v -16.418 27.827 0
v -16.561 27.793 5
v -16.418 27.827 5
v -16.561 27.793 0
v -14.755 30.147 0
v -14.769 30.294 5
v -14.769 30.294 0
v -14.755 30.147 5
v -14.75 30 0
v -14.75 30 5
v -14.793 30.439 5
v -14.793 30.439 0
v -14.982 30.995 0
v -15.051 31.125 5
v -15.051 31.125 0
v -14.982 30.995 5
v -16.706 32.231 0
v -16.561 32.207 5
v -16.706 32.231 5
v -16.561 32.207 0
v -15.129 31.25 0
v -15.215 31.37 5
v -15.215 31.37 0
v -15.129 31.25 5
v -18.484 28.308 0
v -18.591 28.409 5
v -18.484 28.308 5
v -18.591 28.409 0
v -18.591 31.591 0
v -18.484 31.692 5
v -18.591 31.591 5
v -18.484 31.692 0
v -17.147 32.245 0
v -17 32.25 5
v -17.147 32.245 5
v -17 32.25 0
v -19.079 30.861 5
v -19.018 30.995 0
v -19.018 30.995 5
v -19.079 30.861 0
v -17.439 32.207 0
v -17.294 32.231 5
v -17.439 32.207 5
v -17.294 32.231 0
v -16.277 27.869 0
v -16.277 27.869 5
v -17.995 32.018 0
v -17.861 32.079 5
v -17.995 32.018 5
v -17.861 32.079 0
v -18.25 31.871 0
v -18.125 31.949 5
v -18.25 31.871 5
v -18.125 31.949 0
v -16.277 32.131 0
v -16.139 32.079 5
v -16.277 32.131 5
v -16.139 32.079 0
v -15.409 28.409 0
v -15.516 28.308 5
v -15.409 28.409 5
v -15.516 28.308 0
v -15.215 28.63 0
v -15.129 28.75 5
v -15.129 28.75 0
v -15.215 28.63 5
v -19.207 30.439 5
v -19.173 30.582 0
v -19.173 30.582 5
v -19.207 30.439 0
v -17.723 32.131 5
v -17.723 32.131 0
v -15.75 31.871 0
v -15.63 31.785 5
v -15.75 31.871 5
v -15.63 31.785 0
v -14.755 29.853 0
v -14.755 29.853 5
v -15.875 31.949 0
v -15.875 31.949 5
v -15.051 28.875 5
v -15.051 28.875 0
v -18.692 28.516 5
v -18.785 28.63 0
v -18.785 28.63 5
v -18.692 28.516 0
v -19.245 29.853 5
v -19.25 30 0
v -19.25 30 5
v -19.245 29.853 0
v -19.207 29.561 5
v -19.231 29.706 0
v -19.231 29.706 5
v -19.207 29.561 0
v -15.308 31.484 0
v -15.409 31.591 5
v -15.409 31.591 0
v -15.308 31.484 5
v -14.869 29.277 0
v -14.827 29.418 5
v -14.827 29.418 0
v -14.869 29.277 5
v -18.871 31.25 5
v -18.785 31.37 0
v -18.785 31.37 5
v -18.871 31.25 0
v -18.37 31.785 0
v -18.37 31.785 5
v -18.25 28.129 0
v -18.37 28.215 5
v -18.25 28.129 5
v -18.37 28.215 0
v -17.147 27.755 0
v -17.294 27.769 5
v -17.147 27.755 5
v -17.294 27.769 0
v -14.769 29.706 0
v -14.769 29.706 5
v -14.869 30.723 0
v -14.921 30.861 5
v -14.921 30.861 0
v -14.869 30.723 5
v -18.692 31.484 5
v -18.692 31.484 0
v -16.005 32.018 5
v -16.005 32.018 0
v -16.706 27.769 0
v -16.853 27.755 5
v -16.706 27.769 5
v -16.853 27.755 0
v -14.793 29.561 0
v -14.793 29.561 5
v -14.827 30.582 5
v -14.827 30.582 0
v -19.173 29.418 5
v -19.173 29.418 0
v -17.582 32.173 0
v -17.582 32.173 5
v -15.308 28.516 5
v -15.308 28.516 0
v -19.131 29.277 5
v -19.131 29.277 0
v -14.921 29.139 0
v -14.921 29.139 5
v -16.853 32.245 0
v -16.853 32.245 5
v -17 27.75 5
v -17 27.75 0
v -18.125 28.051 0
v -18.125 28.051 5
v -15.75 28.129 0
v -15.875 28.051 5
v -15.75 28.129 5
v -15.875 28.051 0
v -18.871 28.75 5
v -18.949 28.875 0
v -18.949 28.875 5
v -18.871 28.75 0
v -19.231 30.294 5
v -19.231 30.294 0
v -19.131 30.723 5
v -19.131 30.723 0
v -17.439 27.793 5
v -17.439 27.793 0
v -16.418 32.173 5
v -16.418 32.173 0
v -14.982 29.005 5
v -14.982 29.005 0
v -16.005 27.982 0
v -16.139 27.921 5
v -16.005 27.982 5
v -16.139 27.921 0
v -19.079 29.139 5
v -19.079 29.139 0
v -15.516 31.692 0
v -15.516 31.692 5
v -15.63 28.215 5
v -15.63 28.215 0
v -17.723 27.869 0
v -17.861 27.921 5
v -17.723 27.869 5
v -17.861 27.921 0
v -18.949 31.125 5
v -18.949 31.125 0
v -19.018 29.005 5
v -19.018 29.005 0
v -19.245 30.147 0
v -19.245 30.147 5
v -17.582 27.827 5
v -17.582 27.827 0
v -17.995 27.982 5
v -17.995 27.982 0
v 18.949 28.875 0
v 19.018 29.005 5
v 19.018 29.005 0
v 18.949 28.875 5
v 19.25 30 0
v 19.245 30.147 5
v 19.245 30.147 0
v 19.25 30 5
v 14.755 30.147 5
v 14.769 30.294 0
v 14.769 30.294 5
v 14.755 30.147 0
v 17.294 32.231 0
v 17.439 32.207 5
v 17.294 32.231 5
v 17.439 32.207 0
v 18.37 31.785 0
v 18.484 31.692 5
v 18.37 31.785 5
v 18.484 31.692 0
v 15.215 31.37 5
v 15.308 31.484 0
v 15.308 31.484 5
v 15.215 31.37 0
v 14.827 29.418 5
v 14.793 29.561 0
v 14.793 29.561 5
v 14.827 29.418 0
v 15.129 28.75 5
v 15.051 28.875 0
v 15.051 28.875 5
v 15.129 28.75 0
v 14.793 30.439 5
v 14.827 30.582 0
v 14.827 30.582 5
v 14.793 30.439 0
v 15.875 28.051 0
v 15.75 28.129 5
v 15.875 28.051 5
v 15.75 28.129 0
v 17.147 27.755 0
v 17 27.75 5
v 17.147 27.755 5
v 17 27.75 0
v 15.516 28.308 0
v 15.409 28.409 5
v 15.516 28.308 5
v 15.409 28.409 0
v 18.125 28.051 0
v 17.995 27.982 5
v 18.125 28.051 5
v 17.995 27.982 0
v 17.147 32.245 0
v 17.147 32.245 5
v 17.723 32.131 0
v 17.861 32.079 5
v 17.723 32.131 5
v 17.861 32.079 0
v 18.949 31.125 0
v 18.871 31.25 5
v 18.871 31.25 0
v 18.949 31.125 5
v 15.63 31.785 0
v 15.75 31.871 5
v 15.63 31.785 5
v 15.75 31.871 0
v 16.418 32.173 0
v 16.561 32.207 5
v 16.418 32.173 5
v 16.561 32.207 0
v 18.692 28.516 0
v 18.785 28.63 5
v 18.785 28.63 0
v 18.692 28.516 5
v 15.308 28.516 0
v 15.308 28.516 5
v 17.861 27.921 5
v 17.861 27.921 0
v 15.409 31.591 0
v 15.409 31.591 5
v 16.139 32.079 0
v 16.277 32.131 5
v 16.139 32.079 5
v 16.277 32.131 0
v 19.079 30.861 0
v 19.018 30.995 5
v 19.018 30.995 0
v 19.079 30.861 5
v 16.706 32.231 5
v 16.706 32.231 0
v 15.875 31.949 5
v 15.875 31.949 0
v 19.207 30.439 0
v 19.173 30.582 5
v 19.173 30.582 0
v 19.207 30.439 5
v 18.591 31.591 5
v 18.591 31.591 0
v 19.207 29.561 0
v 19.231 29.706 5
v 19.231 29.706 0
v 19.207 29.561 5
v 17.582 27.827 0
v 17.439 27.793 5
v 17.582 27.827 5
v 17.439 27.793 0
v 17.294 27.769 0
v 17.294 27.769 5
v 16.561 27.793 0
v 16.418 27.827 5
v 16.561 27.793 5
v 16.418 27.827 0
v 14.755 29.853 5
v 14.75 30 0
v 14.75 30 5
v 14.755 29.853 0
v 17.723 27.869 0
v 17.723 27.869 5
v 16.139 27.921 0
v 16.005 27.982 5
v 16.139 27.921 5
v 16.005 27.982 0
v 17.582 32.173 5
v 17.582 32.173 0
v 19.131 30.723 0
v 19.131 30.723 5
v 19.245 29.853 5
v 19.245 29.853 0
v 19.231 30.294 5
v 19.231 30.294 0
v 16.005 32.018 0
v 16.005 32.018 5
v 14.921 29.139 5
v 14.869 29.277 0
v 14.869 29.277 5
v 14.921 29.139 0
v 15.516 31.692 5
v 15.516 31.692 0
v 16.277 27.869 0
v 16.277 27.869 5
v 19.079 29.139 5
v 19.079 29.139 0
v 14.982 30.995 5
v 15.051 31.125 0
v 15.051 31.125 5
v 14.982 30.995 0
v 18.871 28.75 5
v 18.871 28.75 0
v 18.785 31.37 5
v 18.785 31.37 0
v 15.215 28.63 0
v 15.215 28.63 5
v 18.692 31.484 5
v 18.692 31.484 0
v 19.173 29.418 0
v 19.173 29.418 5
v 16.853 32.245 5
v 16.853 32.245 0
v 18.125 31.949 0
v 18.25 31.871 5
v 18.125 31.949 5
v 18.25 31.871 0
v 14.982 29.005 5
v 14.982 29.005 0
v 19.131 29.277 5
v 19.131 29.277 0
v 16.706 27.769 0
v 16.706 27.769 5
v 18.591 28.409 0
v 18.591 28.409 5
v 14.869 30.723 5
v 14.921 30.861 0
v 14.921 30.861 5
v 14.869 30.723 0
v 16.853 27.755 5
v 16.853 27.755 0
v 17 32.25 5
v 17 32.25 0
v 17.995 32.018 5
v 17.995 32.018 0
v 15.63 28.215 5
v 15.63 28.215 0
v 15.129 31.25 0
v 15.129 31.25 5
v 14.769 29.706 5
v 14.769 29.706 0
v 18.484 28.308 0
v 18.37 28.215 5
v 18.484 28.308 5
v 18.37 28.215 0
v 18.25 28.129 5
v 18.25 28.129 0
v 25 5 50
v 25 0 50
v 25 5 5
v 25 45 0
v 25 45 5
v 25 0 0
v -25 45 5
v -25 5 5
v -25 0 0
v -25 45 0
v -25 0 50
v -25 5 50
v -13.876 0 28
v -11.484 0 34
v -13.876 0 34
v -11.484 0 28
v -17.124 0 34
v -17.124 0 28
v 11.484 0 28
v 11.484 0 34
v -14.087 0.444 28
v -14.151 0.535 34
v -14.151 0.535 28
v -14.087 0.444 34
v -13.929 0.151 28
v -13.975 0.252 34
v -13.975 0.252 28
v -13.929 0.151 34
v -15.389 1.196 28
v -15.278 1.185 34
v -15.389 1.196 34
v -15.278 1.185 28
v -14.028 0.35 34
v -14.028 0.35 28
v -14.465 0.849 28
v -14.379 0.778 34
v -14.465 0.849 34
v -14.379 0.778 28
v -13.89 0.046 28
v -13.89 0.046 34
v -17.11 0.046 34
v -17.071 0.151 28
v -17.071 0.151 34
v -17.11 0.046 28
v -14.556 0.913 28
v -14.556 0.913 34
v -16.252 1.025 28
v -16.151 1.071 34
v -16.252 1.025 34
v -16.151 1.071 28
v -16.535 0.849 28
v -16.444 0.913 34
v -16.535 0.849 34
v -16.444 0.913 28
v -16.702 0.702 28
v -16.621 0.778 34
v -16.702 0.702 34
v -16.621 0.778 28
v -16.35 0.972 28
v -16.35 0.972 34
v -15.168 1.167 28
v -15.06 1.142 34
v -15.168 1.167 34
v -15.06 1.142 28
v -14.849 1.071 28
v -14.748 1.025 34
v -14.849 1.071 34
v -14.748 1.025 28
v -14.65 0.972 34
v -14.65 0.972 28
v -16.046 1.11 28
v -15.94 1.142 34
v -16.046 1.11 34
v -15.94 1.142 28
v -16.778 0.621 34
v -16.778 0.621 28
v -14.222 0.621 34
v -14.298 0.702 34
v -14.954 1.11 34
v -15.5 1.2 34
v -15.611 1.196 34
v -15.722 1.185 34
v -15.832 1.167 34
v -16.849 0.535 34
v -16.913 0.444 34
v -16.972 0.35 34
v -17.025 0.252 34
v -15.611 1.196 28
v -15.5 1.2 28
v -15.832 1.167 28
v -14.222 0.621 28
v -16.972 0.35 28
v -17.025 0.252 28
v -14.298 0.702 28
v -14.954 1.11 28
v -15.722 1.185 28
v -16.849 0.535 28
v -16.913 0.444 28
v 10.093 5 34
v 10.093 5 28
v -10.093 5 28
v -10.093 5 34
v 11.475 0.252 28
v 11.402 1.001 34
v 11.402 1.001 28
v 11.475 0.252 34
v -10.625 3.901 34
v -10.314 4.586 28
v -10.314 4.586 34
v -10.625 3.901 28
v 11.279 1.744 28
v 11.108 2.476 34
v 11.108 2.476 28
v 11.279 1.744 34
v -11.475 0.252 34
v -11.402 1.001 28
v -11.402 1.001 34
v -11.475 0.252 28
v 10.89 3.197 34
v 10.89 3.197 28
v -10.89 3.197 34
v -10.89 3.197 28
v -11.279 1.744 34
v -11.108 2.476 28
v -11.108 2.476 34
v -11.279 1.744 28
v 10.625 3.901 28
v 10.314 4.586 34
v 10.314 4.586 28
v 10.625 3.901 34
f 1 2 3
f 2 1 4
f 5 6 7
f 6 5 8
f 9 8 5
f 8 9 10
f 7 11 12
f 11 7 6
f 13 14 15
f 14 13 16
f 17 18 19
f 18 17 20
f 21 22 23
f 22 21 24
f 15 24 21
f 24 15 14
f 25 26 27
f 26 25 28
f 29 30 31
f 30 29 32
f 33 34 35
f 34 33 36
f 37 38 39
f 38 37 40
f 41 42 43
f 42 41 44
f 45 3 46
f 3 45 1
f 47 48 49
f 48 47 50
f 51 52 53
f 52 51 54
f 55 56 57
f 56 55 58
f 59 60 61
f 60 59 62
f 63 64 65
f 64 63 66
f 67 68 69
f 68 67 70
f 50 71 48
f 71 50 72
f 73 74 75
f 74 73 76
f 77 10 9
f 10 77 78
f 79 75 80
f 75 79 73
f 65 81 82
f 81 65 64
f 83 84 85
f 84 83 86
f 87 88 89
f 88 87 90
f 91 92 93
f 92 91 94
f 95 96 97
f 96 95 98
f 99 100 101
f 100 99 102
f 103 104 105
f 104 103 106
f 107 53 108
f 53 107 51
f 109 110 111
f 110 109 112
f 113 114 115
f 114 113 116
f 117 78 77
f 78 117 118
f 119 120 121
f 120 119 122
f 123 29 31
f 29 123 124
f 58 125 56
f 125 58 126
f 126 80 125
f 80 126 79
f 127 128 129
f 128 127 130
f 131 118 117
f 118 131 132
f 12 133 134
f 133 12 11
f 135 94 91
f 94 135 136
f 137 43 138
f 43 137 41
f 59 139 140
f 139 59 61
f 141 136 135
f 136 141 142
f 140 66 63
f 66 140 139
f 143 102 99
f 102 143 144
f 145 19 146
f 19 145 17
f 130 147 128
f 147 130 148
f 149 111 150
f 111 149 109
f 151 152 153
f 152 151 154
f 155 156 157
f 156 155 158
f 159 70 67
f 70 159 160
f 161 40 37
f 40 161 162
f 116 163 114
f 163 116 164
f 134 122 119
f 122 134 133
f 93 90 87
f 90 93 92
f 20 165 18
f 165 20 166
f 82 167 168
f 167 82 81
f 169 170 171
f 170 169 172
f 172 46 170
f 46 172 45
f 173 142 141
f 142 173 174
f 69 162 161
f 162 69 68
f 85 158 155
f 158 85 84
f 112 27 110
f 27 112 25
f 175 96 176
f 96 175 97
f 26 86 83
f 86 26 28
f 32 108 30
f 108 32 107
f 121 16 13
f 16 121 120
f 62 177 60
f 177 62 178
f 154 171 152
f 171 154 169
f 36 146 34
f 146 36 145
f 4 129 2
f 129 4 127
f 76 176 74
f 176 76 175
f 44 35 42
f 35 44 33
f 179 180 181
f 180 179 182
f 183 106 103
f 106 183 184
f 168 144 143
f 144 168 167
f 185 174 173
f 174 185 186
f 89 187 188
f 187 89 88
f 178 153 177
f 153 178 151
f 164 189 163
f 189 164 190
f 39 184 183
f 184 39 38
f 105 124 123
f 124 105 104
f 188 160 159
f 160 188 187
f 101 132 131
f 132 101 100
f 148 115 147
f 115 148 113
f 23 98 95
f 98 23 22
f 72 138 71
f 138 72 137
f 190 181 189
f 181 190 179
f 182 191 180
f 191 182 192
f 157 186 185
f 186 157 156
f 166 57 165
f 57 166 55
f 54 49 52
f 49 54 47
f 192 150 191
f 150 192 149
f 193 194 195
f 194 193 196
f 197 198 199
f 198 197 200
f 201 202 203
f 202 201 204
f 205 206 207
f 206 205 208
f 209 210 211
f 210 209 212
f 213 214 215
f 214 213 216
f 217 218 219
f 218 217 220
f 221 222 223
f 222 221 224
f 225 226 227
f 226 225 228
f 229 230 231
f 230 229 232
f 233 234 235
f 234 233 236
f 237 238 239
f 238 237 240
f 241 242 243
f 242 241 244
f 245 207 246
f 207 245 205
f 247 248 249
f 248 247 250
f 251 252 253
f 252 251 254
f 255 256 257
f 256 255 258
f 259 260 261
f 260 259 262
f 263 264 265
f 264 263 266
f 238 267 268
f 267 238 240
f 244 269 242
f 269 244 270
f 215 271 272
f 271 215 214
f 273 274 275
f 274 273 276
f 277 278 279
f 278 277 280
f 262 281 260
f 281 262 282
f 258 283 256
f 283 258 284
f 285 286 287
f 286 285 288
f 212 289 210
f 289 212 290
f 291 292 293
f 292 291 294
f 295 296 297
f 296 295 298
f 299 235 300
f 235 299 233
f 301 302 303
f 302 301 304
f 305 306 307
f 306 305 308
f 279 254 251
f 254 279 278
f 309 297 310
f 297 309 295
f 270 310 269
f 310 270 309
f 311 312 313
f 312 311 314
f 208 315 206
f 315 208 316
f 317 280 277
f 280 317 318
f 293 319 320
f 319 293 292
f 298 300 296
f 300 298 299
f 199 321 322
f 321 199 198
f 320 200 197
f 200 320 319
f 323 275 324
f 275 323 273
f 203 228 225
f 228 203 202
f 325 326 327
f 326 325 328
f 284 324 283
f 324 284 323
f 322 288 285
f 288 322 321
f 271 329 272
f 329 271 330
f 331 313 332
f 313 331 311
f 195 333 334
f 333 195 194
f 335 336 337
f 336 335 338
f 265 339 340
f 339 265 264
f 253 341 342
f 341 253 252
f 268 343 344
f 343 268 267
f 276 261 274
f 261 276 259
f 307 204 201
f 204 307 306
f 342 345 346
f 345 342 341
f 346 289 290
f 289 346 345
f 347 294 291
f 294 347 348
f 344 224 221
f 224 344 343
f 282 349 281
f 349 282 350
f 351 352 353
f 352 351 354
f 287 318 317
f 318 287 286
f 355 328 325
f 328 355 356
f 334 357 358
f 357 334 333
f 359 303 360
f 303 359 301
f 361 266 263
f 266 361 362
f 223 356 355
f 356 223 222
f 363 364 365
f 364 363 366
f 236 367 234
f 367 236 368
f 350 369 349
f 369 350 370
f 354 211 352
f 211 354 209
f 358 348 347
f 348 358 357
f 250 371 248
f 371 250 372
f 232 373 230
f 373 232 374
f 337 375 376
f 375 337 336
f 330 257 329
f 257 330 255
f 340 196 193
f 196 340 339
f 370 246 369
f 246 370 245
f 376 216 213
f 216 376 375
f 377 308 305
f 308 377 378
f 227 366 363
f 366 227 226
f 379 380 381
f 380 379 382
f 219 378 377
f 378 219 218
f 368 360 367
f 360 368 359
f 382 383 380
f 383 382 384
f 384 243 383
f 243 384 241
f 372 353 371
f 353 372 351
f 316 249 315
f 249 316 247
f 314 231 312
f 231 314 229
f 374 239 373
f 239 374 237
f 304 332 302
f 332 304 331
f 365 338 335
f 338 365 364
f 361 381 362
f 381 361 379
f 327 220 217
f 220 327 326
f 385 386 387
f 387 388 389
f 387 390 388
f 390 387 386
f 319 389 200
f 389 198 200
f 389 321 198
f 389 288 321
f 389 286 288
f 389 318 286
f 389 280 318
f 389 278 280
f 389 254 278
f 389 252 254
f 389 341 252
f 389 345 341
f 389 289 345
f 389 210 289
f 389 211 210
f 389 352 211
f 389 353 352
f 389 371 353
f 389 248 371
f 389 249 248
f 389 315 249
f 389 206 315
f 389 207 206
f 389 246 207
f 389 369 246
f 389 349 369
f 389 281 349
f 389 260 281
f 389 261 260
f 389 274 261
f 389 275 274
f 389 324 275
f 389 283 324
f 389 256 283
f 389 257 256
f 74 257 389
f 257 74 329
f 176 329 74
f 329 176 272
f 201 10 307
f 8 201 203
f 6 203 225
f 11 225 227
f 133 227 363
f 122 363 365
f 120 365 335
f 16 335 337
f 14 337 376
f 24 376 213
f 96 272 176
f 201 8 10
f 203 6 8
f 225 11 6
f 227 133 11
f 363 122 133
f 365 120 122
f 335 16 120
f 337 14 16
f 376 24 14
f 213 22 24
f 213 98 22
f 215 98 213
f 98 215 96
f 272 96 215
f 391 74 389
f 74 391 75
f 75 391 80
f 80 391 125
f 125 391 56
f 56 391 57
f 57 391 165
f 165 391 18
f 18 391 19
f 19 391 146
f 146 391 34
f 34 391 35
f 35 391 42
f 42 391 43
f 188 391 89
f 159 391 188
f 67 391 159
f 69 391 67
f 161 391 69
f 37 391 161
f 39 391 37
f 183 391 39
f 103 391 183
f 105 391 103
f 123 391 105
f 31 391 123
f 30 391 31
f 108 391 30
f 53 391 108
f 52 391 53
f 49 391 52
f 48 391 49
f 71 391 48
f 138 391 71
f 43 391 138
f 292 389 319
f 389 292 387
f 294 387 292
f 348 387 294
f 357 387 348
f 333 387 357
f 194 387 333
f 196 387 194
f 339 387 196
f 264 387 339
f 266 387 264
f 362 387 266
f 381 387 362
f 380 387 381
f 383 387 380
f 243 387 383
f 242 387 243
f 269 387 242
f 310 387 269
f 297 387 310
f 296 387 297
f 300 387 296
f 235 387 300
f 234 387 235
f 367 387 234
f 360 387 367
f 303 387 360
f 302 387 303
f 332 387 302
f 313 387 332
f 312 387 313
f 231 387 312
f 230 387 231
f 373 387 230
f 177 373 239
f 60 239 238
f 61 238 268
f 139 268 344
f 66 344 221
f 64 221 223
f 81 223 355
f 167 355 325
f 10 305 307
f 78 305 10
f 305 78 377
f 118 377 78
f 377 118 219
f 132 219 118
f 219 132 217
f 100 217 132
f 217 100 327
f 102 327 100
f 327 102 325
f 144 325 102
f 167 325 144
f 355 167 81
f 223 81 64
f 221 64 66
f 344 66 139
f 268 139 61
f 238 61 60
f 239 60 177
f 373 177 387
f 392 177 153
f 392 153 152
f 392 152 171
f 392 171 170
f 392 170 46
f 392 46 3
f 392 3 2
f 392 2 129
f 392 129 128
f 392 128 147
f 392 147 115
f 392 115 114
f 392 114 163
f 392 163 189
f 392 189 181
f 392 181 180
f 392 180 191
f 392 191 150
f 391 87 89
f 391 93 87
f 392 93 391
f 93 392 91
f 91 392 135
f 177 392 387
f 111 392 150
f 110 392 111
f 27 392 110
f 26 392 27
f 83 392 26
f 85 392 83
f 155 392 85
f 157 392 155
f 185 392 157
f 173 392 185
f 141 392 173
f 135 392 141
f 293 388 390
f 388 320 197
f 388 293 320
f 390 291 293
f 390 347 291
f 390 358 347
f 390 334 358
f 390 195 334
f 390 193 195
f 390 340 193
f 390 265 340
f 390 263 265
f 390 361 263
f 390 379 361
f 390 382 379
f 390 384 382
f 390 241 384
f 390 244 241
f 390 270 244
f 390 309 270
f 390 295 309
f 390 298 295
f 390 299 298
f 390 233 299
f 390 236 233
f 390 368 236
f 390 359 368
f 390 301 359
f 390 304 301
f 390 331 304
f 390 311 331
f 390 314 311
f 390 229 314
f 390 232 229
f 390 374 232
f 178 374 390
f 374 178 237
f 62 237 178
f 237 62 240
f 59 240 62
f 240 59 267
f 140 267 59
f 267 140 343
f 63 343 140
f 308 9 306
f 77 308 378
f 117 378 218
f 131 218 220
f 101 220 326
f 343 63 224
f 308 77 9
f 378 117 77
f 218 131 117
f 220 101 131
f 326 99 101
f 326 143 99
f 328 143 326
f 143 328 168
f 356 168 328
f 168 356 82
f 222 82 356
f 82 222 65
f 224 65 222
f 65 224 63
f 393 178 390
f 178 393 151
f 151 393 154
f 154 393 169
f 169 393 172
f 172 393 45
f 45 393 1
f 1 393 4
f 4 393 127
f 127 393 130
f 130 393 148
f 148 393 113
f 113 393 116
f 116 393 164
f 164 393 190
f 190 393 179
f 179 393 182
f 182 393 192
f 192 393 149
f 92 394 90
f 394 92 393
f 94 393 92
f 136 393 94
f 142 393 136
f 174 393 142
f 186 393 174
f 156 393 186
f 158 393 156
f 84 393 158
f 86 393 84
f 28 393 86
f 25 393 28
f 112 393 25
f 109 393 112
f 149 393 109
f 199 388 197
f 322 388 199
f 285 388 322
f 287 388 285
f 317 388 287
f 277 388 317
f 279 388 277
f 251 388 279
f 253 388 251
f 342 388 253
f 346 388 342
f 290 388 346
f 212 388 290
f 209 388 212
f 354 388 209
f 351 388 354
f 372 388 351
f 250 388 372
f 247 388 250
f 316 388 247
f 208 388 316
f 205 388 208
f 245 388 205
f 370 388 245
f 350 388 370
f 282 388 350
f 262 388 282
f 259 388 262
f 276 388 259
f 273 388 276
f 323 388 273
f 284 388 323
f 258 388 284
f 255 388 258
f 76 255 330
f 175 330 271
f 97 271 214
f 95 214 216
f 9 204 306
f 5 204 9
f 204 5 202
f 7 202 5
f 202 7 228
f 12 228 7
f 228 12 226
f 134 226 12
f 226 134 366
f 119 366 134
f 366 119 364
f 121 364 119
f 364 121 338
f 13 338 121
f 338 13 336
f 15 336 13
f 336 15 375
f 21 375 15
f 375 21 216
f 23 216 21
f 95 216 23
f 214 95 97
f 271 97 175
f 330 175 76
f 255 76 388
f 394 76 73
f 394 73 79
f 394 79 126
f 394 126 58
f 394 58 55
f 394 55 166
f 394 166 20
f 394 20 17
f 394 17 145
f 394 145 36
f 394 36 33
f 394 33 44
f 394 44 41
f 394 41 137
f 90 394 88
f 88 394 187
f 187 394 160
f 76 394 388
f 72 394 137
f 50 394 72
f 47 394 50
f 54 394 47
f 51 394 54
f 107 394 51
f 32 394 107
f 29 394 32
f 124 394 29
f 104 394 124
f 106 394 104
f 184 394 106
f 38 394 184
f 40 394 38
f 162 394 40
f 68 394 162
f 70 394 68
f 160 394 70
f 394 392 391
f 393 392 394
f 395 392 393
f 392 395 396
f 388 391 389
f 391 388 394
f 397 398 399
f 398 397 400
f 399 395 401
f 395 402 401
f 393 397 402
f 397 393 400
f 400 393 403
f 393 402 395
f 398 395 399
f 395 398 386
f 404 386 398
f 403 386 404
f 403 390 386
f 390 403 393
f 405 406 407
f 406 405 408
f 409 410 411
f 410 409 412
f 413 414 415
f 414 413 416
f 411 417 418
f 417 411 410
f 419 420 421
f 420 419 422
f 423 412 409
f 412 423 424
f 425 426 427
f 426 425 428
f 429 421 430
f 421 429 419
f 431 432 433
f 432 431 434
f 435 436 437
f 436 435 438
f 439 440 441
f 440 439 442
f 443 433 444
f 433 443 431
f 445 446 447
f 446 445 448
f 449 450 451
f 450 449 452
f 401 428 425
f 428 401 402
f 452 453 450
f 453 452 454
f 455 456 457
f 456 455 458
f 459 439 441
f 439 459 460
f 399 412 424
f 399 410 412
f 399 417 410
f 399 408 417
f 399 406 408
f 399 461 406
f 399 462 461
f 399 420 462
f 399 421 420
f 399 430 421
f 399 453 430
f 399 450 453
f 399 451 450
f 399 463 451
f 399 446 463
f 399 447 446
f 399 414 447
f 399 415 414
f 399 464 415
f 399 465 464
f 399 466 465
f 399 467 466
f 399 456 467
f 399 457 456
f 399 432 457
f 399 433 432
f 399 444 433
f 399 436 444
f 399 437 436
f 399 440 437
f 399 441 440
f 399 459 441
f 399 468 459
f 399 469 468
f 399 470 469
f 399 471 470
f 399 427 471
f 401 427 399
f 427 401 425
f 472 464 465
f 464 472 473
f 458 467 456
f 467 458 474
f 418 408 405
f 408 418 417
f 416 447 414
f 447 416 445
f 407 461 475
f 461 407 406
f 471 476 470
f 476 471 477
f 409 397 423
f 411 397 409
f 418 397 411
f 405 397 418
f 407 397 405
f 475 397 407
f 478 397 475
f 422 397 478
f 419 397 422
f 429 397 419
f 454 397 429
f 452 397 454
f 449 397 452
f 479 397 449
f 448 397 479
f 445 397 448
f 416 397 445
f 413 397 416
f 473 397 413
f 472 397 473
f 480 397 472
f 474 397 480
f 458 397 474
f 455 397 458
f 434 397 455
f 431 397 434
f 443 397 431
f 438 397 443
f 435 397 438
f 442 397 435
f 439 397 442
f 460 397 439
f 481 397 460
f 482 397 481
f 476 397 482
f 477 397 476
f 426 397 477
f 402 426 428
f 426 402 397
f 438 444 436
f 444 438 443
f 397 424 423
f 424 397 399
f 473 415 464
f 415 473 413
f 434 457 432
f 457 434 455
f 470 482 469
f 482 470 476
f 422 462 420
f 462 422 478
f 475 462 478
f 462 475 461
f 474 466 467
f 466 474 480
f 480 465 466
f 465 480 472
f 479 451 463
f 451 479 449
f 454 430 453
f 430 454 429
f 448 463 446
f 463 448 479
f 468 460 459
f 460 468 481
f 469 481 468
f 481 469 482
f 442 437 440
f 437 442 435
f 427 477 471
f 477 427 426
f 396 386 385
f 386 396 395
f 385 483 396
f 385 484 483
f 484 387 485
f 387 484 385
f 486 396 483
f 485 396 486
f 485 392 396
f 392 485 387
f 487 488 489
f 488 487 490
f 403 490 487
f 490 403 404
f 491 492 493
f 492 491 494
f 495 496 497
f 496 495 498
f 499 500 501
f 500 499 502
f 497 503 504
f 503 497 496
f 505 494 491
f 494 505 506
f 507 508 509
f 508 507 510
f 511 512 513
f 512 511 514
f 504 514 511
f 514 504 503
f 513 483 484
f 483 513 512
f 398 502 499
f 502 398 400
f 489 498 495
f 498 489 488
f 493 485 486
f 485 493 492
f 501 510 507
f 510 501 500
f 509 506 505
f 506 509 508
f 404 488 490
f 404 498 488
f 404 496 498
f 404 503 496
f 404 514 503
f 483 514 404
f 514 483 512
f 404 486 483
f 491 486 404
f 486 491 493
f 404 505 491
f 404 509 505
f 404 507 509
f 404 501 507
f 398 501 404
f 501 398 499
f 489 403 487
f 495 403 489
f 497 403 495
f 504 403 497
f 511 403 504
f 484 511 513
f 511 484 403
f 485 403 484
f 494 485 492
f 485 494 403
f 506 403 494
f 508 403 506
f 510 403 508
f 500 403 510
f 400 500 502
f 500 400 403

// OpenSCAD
// L-shaped mounting bracket for NEMA 17 stepper motor (e.g. syringe pump)
// Print orientation: base plate on bed, vertical plate builds up in +Z

// ---------------- Parameters ----------------
base_x      = 25;     // base plate extends x = -base_x .. +base_x
base_y      = 45;     // base plate extends y = 0 .. base_y
base_t      = 5;      // base plate thickness (z)

hole_m4_x   = 17;     // M4 hole x offset from origin (holes at +/- x)
hole_m4_y   = 30;     // M4 hole y position
hole_m4_d   = 4.5;    // M4 hole diameter

motor_x     = 25;     // motor plate extends x = -motor_x .. +motor_x
motor_y     = 5;      // motor plate extends y = 0 .. motor_y
motor_h     = 50;     // motor plate height (z)

boss_d      = 23;     // motor centring boss hole diameter
boss_x      = 0;      // boss hole x centre
boss_z      = 28;     // boss hole z centre

screw_d     = 3.4;    // M3 screw hole diameter
screw_pitch = 31;     // square pattern side length
screw_n     = 4;      // number of screw holes

gusset_t    = 5;      // gusset thickness (x)
gusset_leg  = 20;     // right triangle legs along +Y and +Z
gusset_x0   = -25;    // left gusset x start
gusset_x1   = 25;     // right gusset x start

eps         = 0.5;    // cutter overshoot past faces

$fn = 96;

// ---------------- Model ----------------
union() {
    // Base plate with M4 through-holes
    difference() {
        translate([-base_x, 0, 0]) cube([2*base_x, base_y, base_t]);
        for (sx = [-1, 1])
            translate([sx*hole_m4_x, hole_m4_y, -eps])
                cylinder(d = hole_m4_d, h = base_t + 2*eps);
    }

    // Vertical motor plate with boss hole and M3 screw holes
    difference() {
        translate([-motor_x, 0, 0]) cube([2*motor_x, motor_y, motor_h]);
        translate([boss_x, -eps, boss_z])
            cylinder(d = boss_d, h = motor_y + 2*eps);
        for (i = [0:3]) {
            a = (i < 2) ? 0 : 90;
            translate([0, -eps, boss_z + (i < 2 ? 0 : motor_y - boss_z)])
                rotate([0, 0, a])
                    translate([-screw_pitch/2, 0, 0])
                        cylinder(d = screw_d, h = motor_y + 2*eps);
        }
    }

    // Triangular gussets flush with left and right edges
    for (sx = [-1, 1]) {
        x1 = sx == -1 ? gusset_x0 : gusset_x1;
        translate([x1, 5, 5])
            linear_extrude(gusset_t)
                translate([-gusset_leg, 0, 0])
                    cube([gusset_leg, gusset_leg, 1]);
    }
}
